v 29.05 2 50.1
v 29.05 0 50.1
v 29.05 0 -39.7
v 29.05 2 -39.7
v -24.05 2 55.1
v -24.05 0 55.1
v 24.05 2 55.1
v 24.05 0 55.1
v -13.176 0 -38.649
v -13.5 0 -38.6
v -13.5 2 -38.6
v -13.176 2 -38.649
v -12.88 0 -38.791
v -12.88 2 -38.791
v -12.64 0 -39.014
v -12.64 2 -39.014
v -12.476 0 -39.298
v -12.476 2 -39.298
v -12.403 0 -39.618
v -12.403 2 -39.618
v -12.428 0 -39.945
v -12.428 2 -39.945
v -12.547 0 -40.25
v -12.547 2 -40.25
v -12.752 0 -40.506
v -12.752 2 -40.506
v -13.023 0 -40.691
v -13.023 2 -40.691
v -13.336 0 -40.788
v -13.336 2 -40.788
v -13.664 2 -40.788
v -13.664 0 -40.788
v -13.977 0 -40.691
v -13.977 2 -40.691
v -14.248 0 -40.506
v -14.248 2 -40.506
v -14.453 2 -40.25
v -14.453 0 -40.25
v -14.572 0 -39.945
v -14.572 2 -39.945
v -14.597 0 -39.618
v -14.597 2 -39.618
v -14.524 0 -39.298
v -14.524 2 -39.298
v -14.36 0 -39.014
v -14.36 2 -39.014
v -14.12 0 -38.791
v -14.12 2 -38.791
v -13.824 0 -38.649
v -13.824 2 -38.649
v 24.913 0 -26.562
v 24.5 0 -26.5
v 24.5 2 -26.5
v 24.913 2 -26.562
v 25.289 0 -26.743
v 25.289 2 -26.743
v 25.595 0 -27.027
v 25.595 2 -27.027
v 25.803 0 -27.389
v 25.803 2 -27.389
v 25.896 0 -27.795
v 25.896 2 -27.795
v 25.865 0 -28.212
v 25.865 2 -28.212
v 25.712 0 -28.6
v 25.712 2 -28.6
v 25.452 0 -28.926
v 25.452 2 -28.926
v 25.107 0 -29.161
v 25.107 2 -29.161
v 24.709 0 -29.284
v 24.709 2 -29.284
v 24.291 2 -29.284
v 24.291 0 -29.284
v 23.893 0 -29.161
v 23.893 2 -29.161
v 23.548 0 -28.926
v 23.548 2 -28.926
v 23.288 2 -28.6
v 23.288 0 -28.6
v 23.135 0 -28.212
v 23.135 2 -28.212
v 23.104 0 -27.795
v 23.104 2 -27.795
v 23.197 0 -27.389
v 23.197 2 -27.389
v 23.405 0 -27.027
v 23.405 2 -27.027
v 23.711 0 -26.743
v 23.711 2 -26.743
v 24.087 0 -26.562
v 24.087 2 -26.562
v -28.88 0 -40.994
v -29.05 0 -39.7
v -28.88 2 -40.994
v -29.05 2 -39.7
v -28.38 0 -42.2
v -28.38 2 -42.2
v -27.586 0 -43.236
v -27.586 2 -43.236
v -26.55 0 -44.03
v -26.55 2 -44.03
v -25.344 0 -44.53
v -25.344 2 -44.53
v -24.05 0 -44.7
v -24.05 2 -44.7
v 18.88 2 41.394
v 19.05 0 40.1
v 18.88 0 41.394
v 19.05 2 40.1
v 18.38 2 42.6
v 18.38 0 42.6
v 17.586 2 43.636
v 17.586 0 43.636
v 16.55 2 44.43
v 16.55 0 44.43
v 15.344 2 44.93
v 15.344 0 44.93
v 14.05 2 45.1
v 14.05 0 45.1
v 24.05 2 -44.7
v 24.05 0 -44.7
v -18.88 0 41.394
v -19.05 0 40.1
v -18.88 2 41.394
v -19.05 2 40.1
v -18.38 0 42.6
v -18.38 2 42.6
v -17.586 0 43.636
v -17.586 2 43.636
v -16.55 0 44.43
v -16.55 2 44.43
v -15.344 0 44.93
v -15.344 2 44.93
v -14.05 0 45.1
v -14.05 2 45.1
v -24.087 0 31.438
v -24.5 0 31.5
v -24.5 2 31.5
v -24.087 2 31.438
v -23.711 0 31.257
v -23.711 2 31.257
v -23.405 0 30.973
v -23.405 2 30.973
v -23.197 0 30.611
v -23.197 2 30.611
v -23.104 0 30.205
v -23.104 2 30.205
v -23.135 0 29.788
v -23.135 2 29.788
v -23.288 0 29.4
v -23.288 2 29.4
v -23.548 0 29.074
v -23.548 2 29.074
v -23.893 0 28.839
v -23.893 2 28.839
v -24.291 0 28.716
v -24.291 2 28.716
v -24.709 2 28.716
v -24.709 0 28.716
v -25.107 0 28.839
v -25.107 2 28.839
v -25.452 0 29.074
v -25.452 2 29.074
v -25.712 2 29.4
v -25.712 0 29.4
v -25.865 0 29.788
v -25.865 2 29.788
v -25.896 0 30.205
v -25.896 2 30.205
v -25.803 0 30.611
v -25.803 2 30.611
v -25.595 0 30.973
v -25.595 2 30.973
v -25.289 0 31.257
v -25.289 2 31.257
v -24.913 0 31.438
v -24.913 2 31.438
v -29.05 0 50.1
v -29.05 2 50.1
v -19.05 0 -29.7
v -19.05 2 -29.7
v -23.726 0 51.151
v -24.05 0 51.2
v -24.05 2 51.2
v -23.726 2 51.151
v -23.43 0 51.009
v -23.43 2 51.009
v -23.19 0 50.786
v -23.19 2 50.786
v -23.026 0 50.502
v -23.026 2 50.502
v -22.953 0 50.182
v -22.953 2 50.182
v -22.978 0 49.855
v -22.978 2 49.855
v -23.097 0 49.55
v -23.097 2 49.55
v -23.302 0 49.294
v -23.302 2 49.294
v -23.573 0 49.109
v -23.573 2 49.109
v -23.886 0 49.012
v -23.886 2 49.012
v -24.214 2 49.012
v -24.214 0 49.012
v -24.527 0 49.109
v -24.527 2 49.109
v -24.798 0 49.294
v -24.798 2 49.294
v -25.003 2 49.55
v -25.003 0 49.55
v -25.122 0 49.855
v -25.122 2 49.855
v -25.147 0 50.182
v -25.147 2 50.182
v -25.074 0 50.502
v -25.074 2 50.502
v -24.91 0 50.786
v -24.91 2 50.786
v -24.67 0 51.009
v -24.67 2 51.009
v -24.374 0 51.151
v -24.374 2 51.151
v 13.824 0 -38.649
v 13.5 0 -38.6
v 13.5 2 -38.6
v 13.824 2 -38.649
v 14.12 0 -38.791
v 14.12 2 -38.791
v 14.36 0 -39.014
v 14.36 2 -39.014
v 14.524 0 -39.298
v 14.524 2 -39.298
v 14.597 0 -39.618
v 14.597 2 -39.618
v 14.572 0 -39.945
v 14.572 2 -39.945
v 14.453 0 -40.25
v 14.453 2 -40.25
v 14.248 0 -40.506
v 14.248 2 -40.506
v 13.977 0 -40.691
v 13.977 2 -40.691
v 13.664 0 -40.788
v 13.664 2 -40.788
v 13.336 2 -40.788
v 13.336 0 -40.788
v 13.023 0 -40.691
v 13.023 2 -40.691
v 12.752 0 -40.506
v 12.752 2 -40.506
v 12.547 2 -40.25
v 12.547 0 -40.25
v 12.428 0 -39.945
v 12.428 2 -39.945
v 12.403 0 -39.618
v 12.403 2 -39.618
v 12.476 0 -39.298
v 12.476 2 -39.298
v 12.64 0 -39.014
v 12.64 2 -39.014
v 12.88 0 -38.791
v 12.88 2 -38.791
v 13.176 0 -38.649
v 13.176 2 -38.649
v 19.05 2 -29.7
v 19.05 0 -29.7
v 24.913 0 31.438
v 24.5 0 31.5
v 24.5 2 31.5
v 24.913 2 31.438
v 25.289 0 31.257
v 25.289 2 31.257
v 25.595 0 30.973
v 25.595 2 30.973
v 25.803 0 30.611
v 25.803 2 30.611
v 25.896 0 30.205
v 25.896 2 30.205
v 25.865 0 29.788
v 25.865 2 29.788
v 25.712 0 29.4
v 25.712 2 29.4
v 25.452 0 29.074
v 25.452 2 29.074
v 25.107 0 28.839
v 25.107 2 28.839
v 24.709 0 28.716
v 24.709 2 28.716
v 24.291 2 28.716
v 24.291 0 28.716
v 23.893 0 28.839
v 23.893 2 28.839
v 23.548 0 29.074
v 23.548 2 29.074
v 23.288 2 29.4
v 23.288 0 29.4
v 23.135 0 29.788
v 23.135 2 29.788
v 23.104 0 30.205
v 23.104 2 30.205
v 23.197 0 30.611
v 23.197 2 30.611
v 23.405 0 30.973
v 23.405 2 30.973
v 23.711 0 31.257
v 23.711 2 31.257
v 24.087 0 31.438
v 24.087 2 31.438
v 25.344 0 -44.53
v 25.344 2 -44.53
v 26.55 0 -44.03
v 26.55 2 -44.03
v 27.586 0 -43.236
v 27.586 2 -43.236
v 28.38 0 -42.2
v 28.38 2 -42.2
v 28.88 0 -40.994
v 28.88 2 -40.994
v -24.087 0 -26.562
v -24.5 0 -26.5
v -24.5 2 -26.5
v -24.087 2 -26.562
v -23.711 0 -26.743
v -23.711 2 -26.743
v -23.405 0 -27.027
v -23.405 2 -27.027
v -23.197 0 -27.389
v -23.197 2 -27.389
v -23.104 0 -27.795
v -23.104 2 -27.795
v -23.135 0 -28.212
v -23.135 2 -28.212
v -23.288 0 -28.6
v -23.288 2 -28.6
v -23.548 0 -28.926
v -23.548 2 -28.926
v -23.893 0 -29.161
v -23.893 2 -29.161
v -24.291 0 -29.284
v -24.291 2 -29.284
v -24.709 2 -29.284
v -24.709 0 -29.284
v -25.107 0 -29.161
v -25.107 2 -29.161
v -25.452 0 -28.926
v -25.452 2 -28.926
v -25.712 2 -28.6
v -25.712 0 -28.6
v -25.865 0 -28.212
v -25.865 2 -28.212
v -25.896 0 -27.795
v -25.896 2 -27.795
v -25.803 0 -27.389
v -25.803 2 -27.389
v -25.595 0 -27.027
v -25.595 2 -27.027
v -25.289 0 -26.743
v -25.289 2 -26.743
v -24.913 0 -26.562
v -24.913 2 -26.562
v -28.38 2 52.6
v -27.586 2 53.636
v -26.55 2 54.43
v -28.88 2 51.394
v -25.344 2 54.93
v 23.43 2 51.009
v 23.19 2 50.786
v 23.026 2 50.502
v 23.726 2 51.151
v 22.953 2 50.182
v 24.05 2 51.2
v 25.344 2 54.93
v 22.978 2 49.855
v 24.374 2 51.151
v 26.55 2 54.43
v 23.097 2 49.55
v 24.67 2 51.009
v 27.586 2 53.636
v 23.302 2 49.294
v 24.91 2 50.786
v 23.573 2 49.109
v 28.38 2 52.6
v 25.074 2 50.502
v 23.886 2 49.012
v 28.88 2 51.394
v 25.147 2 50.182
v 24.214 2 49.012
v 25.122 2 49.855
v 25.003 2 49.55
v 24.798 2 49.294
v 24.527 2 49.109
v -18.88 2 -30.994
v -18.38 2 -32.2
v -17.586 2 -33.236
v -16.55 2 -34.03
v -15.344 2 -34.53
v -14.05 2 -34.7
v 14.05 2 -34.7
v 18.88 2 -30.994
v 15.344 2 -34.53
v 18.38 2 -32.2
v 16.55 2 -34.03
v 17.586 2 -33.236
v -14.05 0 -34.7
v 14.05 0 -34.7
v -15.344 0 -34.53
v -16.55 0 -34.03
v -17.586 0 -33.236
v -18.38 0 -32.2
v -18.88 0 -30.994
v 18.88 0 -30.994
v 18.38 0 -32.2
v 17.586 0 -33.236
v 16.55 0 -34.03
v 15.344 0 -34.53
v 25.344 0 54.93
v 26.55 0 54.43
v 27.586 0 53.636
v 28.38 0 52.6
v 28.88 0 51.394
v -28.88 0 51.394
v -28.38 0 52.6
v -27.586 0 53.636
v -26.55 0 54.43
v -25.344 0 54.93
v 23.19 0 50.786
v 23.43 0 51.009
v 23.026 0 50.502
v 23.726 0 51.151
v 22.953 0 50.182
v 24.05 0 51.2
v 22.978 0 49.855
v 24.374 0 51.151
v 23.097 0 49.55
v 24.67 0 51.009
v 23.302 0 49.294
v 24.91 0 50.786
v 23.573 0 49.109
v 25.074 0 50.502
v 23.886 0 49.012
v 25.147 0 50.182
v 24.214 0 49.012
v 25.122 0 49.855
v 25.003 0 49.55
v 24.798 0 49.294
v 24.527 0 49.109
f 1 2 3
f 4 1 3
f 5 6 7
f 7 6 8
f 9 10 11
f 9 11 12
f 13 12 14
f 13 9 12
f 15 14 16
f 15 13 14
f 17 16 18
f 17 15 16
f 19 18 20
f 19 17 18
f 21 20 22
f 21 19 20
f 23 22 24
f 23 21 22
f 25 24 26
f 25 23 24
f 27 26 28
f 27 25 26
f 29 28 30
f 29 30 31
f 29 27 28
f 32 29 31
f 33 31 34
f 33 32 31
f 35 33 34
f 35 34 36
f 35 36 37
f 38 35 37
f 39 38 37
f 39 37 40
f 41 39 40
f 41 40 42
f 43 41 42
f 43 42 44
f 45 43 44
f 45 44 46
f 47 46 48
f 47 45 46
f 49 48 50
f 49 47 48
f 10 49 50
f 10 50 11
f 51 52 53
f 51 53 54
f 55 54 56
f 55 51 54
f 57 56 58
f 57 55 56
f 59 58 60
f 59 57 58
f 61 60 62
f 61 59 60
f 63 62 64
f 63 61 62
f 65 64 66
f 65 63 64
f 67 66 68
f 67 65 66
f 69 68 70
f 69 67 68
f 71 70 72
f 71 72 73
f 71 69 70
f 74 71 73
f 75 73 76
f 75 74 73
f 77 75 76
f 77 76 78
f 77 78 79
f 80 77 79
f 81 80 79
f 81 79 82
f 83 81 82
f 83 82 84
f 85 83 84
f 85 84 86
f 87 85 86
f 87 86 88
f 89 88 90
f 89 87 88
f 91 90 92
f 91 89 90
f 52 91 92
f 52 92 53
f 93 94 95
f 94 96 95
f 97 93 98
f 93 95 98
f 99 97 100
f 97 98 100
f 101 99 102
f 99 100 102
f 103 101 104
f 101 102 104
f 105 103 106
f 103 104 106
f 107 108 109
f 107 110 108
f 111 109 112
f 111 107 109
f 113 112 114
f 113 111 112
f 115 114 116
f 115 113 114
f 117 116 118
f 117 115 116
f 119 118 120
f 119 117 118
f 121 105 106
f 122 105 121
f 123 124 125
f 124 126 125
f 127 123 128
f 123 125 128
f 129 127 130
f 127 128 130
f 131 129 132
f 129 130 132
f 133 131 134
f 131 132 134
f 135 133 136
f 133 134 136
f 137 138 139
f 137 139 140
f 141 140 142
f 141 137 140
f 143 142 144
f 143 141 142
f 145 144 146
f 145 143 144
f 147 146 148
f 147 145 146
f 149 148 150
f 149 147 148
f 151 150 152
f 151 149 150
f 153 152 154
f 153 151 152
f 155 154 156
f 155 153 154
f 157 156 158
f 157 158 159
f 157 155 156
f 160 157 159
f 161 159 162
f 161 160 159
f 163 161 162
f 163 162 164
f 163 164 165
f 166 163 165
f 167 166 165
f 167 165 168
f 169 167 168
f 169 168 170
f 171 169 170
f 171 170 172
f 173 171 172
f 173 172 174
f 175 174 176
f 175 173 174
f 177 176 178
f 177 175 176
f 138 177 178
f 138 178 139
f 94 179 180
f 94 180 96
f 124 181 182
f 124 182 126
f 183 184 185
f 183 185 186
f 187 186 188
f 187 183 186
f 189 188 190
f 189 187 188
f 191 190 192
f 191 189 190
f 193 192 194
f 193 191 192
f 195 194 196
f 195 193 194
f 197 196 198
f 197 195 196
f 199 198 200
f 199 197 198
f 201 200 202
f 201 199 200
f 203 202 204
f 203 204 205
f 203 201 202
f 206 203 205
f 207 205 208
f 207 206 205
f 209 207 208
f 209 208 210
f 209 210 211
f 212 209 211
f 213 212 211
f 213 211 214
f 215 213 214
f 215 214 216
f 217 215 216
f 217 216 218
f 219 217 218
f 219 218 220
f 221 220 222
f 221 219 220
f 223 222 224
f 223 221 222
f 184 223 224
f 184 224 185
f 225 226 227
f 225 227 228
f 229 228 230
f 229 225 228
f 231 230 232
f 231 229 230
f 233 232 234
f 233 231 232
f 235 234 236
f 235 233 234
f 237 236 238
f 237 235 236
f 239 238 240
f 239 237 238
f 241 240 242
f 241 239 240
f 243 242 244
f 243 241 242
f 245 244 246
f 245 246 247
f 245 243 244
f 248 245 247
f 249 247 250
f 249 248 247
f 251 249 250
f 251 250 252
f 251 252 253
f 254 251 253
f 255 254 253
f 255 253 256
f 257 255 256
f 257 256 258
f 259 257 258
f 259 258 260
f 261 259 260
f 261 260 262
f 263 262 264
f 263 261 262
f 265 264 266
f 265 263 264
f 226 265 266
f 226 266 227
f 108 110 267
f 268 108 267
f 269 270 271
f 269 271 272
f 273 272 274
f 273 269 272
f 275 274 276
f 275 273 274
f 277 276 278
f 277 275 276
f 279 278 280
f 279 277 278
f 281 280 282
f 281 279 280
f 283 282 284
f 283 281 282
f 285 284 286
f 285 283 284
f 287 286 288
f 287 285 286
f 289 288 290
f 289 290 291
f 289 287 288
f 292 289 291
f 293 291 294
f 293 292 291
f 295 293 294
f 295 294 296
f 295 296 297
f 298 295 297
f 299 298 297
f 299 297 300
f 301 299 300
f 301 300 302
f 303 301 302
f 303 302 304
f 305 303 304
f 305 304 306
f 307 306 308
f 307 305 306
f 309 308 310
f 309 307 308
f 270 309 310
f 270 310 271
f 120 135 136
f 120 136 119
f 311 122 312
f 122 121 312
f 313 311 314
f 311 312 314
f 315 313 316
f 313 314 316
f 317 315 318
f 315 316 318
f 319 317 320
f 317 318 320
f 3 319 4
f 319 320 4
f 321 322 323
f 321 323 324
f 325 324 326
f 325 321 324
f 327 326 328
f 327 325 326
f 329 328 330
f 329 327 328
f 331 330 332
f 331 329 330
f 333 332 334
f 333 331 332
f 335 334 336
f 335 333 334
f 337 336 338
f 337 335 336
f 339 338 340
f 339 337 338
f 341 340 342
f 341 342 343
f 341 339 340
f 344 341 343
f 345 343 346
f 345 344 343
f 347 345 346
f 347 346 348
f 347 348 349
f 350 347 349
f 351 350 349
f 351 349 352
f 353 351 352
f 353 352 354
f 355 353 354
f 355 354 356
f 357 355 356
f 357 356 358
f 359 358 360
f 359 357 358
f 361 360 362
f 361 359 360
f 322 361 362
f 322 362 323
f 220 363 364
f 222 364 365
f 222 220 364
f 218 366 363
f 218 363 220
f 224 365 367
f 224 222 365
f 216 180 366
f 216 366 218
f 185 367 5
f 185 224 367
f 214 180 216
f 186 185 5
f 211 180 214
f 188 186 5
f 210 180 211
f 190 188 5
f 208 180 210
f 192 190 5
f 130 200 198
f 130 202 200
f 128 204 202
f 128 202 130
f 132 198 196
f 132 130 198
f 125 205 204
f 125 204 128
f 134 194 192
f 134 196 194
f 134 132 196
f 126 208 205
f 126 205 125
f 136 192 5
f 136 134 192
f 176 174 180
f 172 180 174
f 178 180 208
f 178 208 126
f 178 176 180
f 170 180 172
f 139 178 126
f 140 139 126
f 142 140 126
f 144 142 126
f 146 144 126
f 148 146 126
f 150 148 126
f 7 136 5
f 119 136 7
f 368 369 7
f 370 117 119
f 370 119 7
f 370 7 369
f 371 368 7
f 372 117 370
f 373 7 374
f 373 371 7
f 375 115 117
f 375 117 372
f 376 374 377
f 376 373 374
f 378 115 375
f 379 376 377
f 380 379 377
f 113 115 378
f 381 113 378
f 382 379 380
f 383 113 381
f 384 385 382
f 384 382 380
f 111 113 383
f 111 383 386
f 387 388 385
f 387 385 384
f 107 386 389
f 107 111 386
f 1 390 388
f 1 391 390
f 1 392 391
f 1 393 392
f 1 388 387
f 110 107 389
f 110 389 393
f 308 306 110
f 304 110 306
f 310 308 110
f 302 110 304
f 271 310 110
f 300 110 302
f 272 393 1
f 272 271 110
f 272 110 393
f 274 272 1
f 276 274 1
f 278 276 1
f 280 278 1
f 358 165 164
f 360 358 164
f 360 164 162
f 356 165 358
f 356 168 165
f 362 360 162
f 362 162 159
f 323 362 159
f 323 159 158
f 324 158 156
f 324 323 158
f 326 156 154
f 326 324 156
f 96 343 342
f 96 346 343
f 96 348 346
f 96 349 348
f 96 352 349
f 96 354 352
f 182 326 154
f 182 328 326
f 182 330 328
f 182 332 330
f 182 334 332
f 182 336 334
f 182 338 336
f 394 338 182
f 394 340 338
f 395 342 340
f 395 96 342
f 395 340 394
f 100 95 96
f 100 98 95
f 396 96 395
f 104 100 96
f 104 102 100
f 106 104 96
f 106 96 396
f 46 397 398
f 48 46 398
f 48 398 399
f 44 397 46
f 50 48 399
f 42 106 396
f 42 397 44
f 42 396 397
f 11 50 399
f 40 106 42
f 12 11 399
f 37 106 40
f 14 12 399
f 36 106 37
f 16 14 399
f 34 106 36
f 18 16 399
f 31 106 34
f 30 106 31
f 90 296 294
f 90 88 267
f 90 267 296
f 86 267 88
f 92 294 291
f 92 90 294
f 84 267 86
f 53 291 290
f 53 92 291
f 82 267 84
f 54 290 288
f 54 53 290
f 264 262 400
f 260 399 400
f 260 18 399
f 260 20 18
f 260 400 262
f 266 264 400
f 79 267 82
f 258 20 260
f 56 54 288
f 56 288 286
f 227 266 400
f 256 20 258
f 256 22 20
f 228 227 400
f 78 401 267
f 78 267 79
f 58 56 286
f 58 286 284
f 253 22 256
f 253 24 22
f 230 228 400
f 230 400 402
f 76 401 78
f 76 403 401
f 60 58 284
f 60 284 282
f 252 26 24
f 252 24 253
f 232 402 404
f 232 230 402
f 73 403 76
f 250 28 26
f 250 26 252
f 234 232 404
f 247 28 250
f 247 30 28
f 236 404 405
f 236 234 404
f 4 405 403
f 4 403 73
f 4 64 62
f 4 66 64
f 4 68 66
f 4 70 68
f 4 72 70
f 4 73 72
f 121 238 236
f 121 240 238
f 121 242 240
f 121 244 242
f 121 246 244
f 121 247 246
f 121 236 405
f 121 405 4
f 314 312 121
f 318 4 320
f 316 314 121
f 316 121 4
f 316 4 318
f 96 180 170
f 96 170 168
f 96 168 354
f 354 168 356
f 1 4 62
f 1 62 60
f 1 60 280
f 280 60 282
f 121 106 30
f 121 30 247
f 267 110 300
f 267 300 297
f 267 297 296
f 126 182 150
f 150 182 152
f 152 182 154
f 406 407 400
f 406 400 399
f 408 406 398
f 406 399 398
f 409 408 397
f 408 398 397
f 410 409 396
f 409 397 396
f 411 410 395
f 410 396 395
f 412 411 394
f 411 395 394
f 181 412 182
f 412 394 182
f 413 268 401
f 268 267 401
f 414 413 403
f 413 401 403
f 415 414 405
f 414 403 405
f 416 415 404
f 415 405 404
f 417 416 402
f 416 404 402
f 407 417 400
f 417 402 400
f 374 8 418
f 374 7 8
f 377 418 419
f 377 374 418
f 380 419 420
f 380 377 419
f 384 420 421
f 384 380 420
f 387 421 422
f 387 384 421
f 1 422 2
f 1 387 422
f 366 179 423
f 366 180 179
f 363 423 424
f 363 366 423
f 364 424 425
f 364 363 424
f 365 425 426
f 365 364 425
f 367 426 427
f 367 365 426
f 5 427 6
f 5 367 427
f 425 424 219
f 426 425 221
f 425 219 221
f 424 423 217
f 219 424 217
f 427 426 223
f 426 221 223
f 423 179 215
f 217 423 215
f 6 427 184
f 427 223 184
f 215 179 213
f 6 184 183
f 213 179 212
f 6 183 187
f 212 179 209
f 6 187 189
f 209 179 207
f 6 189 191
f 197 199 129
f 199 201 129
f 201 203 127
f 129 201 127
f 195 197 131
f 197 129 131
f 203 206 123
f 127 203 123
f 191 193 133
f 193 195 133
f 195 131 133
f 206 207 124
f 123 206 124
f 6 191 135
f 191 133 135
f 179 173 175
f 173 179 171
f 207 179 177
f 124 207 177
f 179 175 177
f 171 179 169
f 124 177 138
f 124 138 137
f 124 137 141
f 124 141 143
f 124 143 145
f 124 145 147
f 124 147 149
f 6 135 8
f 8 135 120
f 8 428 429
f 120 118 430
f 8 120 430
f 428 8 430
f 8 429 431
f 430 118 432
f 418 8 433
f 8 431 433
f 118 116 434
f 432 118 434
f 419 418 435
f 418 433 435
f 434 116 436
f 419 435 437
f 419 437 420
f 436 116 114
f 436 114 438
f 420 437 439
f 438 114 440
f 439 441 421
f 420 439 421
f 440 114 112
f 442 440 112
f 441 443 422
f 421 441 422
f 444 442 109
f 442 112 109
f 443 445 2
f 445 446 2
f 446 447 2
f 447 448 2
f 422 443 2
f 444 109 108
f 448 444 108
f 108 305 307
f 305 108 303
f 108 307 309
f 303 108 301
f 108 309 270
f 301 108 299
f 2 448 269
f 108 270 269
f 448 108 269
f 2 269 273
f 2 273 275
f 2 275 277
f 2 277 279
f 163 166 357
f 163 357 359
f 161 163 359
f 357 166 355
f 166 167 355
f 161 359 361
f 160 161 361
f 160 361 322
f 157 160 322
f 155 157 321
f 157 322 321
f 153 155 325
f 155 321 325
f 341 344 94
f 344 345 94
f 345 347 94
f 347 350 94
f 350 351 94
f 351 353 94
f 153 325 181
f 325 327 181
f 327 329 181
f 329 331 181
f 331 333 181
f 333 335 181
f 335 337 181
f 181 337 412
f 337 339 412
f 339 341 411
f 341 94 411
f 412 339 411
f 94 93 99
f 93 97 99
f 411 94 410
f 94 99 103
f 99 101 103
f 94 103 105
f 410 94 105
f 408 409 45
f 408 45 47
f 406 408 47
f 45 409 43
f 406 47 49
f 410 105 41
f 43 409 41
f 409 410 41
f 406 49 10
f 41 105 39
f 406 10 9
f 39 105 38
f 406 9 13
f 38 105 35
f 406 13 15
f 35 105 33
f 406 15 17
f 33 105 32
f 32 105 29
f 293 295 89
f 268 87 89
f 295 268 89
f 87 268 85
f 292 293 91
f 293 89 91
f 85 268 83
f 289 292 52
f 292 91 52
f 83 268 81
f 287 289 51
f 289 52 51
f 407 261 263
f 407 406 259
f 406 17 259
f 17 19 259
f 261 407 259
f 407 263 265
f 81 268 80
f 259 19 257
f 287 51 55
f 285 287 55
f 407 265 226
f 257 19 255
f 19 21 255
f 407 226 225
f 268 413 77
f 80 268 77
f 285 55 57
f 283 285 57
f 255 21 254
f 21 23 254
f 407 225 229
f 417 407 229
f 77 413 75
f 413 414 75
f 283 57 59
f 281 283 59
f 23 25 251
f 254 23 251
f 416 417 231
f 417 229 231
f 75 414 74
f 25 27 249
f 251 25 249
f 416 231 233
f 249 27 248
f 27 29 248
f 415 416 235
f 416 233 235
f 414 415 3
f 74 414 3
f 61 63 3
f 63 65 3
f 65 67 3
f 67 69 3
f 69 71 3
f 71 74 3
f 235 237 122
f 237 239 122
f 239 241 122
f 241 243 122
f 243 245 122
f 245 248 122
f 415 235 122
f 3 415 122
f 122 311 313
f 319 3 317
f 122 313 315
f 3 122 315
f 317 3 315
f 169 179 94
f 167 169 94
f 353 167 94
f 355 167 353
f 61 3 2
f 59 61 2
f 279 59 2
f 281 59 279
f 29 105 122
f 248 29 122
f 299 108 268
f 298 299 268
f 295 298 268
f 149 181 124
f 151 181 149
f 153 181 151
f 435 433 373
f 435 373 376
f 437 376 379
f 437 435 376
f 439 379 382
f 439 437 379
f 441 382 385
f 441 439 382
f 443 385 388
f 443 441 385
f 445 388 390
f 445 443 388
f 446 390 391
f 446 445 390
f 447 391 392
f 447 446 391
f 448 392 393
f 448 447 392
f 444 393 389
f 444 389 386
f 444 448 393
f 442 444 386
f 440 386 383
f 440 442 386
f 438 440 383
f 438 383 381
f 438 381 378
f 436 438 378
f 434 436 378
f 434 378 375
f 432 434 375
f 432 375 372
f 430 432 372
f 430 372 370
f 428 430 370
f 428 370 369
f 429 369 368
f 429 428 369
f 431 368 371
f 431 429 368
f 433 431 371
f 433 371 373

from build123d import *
from build123d.topology import SkipClean

# Parameters (mm, degrees)
SKETCH3_W           = 58.1
SKETCH3_H           = 99.8
SKETCH3_R           = 1.1
SKETCH3_R_2         = 0.95
SKETCH3_R_3         = 1.4
BOSS_EXTRUDE1_DEPTH = 2
FILLET1_R           = 5
FILLET2_R           = 3
FILLET3_R           = 10
BOSS_EXTRUDE2_START = 1
SKETCH4_R           = 1.6
SKETCH4_R_2         = 0.95
BOSS_EXTRUDE2_DEPTH = 1
SKETCH5_W           = 38.1
SKETCH5_H           = 61.132694782
CUT_EXTRUDE1_DEPTH  = 63.361145756


with BuildPart() as part:
    # Sketch3 → Boss-Extrude1 (new body)
    with BuildSketch(Plane(origin=(0, 0, 0), x_dir=(1, 0, 0), z_dir=(0, 1, 0))):
        with Locations((0, -5.2)):
            Rectangle(SKETCH3_W, SKETCH3_H)
        with Locations(Location((24.05, -50.1, 0), (0, 0, 270))):
            Circle(SKETCH3_R, mode=Mode.SUBTRACT)
        with Locations(Location((-10.3, -10.3, 0), (0, 0, 270))):
            Circle(SKETCH3_R_2, mode=Mode.SUBTRACT)
        with Locations(Location((13.5, 39.7, 0), (0, 0, 270))):
            Circle(SKETCH3_R, mode=Mode.SUBTRACT)
        with Locations(Location((-13.5, 39.7, 0), (0, 0, 270))):
            Circle(SKETCH3_R, mode=Mode.SUBTRACT)
        with Locations(Location((-24.05, -50.1, 0), (0, 0, 270))):
            Circle(SKETCH3_R, mode=Mode.SUBTRACT)
        with Locations(Location((-24.5, 27.9, 0), (0, 0, 270))):
            Circle(SKETCH3_R_3, mode=Mode.SUBTRACT)
        with Locations(Location((24.5, 27.9, 0), (0, 0, 270))):
            Circle(SKETCH3_R_3, mode=Mode.SUBTRACT)
        with Locations(Location((10.3, 10.3, 0), (0, 0, 270))):
            Circle(SKETCH3_R_2, mode=Mode.SUBTRACT)
        with Locations(Location((10.3, -10.3, 0), (0, 0, 270))):
            Circle(SKETCH3_R_2, mode=Mode.SUBTRACT)
        with Locations(Location((-10.3, 10.3, 0), (0, 0, 270))):
            Circle(SKETCH3_R_2, mode=Mode.SUBTRACT)
        with Locations(Location((-24.5, -30.1, 0), (0, 0, 270))):
            Circle(SKETCH3_R_3, mode=Mode.SUBTRACT)
        with Locations(Location((24.5, -30.1, 0), (0, 0, 270))):
            Circle(SKETCH3_R_3, mode=Mode.SUBTRACT)
        with BuildLine():
            Line((19.05, -45.1), (19.05, -22.090559159))
            Line((19.05, -22.090559159), (8.77972042, -11.82027958))
            ThreePointArc((8.77972042, -11.82027958), (8.77972042, -8.77972042), (11.82027958, -8.77972042))
            Line((11.82027958, -8.77972042), (19.05, -16.009440841))
            Line((19.05, -16.009440841), (19.05, 16.009440841))
            Line((19.05, 16.009440841), (11.82027958, 8.77972042))
            ThreePointArc((11.82027958, 8.77972042), (8.77972042, 8.77972042), (8.77972042, 11.82027958))
            Line((8.77972042, 11.82027958), (19.05, 22.090559159))
            Line((19.05, 22.090559159), (19.05, 34.7))
            Line((19.05, 34.7), (-19.05, 34.7))
            Line((-19.05, 34.7), (-19.05, 22.090559159))
            Line((-19.05, 22.090559159), (-8.77972042, 11.82027958))
            ThreePointArc((-8.77972042, 11.82027958), (-8.77972042, 8.77972042), (-11.82027958, 8.77972042))
            Line((-11.82027958, 8.77972042), (-19.05, 16.009440841))
            Line((-19.05, 16.009440841), (-19.05, -16.009440841))
            Line((-19.05, -16.009440841), (-11.82027958, -8.77972042))
            ThreePointArc((-11.82027958, -8.77972042), (-8.77972042, -8.77972042), (-8.77972042, -11.82027958))
            Line((-8.77972042, -11.82027958), (-19.05, -22.090559159))
            Line((-19.05, -22.090559159), (-19.05, -45.1))
            Line((-19.05, -45.1), (19.05, -45.1))
        make_face(mode=Mode.SUBTRACT)
    extrude(amount=BOSS_EXTRUDE1_DEPTH)

    # Fillet1
    fillet1_edges = [part.edges().sort_by_distance(p)[0] for p in [
        (19.05, 1, -34.7),
        (-19.05, 1, -34.7),
        (-19.05, 1, 45.1),
        (19.05, 1, 45.1),
        (29.05, 1, -44.7),
        (29.05, 1, 55.1),
        (-29.05, 1, 55.1),
        (-29.05, 1, -44.7),
    ]]
    fillet(fillet1_edges, radius=FILLET1_R)

    # Fillet2
    fillet2_edges = [part.edges().sort_by_distance(p)[0] for p in [
        (-19.05, 1, -16.009440841),
        (-19.05, 1, 16.009440841),
        (19.05, 1, 16.009440841),
        (19.05, 1, -16.009440841),
    ]]
    fillet(fillet2_edges, radius=FILLET2_R)

    # Fillet3
    fillet3_edges = [part.edges().sort_by_distance(p)[0] for p in [
        (19.05, 1, -22.090559159),
        (-19.05, 1, -22.090559159),
        (-19.05, 1, 22.090559159),
        (19.05, 1, 22.090559159),
    ]]
    fillet(fillet3_edges, radius=FILLET3_R)

    # Sketch4 → Boss-Extrude2 (add)
    # profile 1 of 4: a face of its own
    with SkipClean():  # the faces are left unmerged after this step: merging them gives an invalid solid
        with BuildSketch(Plane.XZ.offset(BOSS_EXTRUDE2_START)):
            with Locations(Location((-10.3, 10.3, 0), (0, 0, 90))):
                Circle(SKETCH4_R)
            with Locations(Location((-10.3, 10.3, 0), (0, 0, 270))):
                Circle(SKETCH4_R_2, mode=Mode.SUBTRACT)
        # profile 2 of 4: a face of its own
        with BuildSketch(Plane.XZ.offset(BOSS_EXTRUDE2_START)):
            with Locations(Location((10.3, 10.3, 0), (0, 0, 90))):
                Circle(SKETCH4_R)
            with Locations(Location((10.3, 10.3, 0), (0, 0, 270))):
                Circle(SKETCH4_R_2, mode=Mode.SUBTRACT)
        # profile 3 of 4: a face of its own
        with BuildSketch(Plane.XZ.offset(BOSS_EXTRUDE2_START)):
            with Locations(Location((10.3, -10.3, 0), (0, 0, 90))):
                Circle(SKETCH4_R)
            with Locations(Location((10.3, -10.3, 0), (0, 0, 270))):
                Circle(SKETCH4_R_2, mode=Mode.SUBTRACT)
        # profile 4 of 4: a face of its own
        with BuildSketch(Plane.XZ.offset(BOSS_EXTRUDE2_START)):
            with Locations(Location((-10.3, -10.3, 0), (0, 0, 90))):
                Circle(SKETCH4_R)
            with Locations(Location((-10.3, -10.3, 0), (0, 0, 270))):
                Circle(SKETCH4_R_2, mode=Mode.SUBTRACT)
        extrude(amount=-BOSS_EXTRUDE2_DEPTH)

    # Sketch5 → Cut-Extrude1 (cut, through all)
    with BuildSketch(Plane(origin=(0, 2, 0), x_dir=(1, 0, 0), z_dir=(0, 1, 0))):
        with Locations((0, -2.6)):
            Rectangle(SKETCH5_W, SKETCH5_H)
    extrude(amount=-CUT_EXTRUDE1_DEPTH, mode=Mode.SUBTRACT)


solid = part.part
